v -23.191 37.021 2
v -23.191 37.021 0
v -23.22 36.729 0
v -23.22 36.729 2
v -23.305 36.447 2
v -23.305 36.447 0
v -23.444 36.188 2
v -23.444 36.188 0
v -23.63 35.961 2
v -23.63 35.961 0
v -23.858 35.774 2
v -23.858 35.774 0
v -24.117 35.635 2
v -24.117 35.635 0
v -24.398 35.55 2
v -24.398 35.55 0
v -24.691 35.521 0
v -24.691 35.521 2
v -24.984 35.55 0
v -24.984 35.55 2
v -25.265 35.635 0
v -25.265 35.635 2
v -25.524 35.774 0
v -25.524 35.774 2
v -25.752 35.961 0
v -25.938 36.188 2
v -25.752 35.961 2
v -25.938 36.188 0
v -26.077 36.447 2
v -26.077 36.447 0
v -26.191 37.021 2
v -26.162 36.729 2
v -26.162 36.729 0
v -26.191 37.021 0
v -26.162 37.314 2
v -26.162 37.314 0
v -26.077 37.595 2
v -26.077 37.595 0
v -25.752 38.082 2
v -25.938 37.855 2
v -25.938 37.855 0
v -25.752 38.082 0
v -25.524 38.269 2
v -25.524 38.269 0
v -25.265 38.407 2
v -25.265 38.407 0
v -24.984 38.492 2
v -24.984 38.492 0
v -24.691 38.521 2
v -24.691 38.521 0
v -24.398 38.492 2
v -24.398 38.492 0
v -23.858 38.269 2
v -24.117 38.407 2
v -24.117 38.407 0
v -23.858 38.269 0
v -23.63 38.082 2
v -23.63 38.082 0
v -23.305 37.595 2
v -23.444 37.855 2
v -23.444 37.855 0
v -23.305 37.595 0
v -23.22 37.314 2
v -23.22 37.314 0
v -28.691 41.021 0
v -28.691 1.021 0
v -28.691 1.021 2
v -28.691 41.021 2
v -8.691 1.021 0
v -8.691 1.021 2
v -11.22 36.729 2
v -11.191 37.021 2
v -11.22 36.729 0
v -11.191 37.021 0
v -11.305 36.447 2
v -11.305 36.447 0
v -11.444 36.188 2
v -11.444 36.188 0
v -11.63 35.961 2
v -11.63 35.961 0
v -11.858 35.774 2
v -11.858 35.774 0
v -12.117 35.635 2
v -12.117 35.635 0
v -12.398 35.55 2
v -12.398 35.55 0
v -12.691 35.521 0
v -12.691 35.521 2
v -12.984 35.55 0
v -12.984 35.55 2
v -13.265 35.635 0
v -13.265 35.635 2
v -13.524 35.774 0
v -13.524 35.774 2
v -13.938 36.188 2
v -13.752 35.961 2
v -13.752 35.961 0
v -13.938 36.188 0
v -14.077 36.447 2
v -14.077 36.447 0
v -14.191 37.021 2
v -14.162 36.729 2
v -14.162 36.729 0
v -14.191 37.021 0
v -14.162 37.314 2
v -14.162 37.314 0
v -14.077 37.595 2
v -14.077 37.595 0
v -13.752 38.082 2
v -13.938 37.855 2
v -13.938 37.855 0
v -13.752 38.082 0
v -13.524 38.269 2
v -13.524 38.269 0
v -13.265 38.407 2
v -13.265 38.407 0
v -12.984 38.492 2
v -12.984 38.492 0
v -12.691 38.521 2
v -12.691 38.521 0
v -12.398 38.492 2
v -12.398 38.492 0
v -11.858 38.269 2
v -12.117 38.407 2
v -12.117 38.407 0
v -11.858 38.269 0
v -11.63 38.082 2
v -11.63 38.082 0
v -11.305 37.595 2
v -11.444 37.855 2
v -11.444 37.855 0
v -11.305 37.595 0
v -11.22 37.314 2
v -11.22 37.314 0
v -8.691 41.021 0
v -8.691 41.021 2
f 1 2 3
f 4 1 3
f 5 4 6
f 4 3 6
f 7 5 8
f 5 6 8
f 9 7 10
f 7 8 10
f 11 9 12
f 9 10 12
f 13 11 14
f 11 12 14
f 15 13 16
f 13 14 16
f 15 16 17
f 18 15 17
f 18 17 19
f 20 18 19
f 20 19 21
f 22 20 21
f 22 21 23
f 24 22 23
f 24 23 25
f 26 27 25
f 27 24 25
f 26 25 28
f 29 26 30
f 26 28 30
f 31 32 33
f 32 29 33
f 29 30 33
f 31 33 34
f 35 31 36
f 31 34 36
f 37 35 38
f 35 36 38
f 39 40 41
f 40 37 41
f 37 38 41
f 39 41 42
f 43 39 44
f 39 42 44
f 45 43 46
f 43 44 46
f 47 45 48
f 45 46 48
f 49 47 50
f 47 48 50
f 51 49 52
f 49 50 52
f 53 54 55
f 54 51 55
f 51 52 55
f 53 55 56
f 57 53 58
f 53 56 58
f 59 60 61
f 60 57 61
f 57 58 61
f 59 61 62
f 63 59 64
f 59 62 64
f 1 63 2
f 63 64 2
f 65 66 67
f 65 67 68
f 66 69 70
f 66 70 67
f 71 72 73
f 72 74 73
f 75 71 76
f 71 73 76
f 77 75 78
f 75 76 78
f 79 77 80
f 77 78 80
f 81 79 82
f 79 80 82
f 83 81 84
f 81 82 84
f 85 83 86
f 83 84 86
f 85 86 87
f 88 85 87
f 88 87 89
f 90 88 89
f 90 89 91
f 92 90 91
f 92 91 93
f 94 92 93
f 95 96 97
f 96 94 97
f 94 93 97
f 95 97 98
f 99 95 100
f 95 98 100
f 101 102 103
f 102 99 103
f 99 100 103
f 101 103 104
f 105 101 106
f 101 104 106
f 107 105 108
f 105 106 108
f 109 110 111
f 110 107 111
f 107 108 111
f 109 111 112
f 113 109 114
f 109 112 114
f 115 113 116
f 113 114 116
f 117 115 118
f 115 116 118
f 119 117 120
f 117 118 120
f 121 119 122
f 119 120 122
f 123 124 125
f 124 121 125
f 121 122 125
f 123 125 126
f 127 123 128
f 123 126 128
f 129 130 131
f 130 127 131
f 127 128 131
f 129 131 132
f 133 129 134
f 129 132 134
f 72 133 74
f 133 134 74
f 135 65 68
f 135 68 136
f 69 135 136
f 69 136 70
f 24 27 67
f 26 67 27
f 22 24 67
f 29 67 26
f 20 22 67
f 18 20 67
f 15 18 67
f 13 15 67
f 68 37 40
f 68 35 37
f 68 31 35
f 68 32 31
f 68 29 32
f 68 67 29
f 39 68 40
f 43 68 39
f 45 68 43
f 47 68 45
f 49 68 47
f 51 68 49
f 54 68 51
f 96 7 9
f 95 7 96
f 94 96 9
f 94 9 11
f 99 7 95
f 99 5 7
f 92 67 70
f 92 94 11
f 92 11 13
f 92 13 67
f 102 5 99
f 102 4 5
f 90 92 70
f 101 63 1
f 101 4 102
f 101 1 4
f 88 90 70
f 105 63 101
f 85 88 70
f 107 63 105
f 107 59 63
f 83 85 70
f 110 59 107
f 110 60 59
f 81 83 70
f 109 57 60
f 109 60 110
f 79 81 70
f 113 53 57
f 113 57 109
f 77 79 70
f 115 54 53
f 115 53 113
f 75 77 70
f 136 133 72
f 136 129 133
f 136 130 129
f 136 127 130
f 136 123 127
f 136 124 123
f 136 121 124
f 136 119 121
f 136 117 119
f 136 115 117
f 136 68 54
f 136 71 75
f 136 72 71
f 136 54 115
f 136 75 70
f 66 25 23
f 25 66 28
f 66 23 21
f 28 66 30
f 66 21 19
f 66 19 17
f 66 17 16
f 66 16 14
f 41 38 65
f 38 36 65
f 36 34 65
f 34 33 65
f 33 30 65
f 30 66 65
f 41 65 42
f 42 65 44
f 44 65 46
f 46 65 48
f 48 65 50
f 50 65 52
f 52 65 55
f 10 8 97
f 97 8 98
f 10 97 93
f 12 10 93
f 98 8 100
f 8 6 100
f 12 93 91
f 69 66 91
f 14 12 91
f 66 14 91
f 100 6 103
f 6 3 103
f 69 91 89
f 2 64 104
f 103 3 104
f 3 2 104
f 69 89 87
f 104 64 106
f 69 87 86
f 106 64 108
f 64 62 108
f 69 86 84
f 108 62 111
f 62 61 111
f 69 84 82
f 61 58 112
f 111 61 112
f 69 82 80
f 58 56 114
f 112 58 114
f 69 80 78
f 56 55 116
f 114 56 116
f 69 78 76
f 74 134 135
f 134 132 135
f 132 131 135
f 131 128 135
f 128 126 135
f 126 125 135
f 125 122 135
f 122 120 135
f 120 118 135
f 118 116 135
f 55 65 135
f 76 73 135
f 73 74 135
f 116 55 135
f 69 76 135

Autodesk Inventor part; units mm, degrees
ref_plane "YZ Plane" through (0, 0, 0) normal (1, 0, 0) x (0, 1, 0)
ref_plane "XZ Plane" through (0, 0, 0) normal (0, 1, 0) x (-1, 0, 0)
ref_plane "XY Plane" through (0, 0, 0) normal (0, 0, 1) x (1, 0, 0)
sketch "Sketch1" plane through (0, 0, 0) normal (0, 0, 1) x (1, 0, 0)
  line L0 (-28.6909, 41.0213) -> (-8.6909, 41.0213)
  line L1 (-8.6909, 41.0213) -> (-8.6909, 1.0213)
  line L2 (-8.6909, 1.0213) -> (-28.6909, 1.0213)
  line L3 (-28.6909, 1.0213) -> (-28.6909, 41.0213)
  circle A0 centre (-24.6909, 37.0213) radius 1.5
  circle A1 centre (-12.6909, 37.0213) radius 1.5
  dimension "d0" = 20
  dimension "d1" = 40
  dimension "d4" = 3
  dimension "d5" = 3
  dimension "d7" = 4
  dimension "d8" = 4
  dimension "d9" = 4
  dimension "d10" = 4
extrude "Extrusion1" add sketch "Sketch1" along normal blind 2
equation "\"d4\" = d5"
equation "\"d7\" = d9"
equation "\"d8\" = d10"
properties part number "Placa PCB 40x20"
